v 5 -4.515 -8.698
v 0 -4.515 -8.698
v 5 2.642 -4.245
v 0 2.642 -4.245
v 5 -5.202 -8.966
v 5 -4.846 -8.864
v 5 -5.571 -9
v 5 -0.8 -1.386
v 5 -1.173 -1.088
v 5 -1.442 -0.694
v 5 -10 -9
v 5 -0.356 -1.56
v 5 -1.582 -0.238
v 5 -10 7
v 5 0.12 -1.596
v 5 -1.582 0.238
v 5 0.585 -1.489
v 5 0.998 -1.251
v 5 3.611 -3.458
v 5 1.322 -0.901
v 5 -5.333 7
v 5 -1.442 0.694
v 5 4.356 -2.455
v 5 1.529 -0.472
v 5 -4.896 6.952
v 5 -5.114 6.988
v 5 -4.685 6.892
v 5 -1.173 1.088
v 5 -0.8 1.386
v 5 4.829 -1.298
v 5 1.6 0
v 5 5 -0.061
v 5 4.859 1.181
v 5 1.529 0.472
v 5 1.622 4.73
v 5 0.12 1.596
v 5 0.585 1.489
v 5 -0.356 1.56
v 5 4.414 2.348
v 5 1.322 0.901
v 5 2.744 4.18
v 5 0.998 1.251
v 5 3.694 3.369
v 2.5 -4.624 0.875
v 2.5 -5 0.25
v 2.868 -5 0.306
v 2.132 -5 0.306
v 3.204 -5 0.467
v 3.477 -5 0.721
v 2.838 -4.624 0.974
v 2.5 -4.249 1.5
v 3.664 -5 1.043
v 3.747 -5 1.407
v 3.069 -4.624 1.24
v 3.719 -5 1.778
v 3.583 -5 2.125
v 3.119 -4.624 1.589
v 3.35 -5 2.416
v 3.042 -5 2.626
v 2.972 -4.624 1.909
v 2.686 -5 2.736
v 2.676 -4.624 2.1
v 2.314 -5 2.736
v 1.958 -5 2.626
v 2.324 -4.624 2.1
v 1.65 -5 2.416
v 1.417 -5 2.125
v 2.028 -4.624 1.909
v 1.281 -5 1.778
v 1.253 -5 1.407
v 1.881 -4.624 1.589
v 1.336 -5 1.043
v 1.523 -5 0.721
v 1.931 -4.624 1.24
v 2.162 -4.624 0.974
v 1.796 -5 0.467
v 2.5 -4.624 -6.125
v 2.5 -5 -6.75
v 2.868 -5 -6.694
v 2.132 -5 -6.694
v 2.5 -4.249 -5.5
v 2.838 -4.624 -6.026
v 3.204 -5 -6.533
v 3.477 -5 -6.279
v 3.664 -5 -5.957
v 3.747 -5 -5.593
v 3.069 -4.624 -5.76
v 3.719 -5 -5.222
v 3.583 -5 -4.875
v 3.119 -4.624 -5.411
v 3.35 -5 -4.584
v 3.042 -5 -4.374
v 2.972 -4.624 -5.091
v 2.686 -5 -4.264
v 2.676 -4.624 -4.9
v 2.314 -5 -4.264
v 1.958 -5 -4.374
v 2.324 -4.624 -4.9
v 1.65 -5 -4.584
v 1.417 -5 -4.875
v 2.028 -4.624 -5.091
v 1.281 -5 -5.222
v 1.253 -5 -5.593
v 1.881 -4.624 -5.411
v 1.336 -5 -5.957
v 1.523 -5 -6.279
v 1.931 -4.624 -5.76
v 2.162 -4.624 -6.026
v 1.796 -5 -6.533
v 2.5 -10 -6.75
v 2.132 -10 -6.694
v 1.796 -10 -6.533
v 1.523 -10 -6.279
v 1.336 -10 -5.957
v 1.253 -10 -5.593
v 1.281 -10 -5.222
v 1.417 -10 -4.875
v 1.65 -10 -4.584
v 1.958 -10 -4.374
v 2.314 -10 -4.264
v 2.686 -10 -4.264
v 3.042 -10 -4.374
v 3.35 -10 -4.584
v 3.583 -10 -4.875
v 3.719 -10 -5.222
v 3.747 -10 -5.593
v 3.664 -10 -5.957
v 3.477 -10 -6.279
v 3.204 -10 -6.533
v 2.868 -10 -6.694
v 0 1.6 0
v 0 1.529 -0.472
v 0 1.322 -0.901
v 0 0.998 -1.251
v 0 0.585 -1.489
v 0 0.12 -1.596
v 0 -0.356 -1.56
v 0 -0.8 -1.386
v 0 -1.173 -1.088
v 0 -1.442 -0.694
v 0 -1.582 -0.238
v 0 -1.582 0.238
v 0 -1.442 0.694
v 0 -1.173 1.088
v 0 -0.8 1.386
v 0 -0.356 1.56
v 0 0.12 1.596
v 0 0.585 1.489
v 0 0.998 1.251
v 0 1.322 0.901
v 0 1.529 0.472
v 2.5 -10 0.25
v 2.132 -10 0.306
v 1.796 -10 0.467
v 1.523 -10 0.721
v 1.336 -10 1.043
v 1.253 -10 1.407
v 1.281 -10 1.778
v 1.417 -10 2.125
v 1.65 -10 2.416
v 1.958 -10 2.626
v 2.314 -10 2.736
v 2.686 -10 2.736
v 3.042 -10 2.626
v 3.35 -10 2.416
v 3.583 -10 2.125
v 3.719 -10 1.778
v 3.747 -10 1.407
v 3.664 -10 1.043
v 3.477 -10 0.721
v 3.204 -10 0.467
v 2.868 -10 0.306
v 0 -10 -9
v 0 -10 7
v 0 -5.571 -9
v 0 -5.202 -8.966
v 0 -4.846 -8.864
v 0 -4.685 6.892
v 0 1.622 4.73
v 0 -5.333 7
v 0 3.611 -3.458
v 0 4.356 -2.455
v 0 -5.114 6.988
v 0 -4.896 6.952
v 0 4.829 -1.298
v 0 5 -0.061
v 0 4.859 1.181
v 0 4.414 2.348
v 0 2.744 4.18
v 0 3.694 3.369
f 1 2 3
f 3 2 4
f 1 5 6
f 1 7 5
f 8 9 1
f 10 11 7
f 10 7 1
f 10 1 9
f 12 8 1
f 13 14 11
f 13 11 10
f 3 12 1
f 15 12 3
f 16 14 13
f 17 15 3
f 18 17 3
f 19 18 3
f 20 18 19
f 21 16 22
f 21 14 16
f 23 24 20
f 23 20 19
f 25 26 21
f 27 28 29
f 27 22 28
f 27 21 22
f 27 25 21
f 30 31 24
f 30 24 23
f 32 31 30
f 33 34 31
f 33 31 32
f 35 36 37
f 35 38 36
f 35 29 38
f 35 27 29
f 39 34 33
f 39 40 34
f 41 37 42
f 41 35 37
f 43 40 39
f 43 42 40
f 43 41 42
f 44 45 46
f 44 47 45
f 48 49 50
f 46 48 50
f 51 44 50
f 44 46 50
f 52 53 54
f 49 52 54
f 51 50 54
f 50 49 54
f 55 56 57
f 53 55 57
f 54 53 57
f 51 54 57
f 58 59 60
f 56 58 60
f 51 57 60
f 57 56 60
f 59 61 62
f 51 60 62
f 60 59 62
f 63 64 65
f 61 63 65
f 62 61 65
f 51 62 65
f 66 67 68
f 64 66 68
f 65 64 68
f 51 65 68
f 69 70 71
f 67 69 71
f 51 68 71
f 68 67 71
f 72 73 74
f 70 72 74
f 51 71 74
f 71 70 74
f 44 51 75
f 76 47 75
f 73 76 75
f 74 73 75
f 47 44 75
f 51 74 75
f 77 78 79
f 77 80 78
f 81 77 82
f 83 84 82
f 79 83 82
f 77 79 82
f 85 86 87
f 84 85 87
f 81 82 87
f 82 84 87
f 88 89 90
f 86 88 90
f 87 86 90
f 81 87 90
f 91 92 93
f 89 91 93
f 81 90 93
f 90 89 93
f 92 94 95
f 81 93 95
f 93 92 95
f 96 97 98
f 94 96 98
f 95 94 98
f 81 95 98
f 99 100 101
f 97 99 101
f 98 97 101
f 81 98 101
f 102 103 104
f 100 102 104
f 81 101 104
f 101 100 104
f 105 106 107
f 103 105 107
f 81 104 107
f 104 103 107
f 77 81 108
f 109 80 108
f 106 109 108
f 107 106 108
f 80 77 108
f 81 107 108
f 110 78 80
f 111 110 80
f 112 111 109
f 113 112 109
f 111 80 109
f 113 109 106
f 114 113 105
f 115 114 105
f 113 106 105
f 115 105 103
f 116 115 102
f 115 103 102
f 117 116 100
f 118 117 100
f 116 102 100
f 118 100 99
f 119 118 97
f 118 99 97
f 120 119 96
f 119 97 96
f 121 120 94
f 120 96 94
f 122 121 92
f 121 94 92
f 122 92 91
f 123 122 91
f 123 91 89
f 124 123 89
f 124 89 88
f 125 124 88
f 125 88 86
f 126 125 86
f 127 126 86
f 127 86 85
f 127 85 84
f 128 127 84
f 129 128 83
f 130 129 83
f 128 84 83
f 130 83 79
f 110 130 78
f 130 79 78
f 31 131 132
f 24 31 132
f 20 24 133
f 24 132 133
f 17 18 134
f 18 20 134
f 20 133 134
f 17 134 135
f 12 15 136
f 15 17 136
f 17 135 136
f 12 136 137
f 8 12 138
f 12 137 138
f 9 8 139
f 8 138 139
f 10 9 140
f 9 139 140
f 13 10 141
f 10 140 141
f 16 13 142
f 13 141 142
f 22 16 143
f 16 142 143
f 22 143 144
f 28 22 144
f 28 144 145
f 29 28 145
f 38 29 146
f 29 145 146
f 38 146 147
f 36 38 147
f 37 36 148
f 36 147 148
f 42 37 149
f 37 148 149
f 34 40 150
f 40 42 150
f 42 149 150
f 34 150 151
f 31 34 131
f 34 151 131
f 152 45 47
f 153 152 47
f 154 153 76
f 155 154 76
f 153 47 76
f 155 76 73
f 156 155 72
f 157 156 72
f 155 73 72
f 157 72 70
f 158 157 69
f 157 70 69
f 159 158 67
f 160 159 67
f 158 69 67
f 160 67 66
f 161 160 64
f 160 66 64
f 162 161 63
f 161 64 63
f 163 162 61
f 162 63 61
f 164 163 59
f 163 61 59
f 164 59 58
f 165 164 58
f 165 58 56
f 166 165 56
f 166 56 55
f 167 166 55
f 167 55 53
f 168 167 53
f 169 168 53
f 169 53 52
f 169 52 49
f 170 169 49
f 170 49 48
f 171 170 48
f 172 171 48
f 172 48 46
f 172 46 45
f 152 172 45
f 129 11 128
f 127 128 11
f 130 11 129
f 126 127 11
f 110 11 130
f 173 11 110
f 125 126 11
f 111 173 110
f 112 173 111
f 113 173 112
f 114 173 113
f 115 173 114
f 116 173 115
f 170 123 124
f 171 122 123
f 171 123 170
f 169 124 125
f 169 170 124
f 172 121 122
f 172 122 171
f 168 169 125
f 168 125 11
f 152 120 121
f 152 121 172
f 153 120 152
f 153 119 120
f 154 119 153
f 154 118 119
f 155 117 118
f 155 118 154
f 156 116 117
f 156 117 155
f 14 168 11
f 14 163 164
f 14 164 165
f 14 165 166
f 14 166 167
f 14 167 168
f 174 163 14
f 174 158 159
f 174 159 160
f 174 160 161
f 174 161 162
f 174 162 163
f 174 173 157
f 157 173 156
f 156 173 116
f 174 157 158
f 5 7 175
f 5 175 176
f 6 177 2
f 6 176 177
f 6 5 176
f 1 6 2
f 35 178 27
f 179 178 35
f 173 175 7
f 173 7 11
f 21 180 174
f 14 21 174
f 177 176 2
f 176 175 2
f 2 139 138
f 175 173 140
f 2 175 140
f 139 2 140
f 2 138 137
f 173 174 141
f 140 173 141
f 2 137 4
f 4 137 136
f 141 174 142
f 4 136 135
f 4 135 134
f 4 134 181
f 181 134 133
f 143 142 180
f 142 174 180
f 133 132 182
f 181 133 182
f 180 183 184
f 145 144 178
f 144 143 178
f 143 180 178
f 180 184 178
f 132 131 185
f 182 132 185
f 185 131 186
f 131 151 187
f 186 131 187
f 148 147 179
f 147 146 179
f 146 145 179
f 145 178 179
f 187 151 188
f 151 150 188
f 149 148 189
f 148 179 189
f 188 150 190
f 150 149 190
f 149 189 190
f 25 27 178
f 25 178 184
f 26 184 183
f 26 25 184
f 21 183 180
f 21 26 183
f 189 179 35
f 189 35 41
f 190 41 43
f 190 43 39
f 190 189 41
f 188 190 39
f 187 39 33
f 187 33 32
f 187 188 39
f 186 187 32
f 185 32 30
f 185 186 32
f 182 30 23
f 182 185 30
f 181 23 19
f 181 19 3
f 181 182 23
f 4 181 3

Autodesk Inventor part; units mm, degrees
ref_plane "YZ Plane" through (0, 0, 0) normal (1, 0, 0) x (0, 1, 0)
ref_plane "XZ Plane" through (0, 0, 0) normal (0, 1, 0) x (-1, 0, 0)
ref_plane "XY Plane" through (0, 0, 0) normal (0, 0, 1) x (1, 0, 0)
sketch "スケッチ1" plane through (0, 0, 0) normal (1, 0, 0) x (0, 1, 0)
  circle A0 centre (0, 0) radius 5
  line L0 (5, 24) -> (-10, 24)
  line L1 (-10, 24) -> (-10, 9)
  line L2 (-10, 9) -> (5, 9)
  line L3 (5, 9) -> (5, 24)
  line L4 (-10, 9) -> (-15, 9)
  line L5 (-15, 9) -> (-15, -9)
  line L6 (-15, -9) -> (-10, -9)
  line L7 (-10, -9) -> (-10, 9)
  line L8 (-10, 9) -> (1.724, 4.6934)
  line L9 (1.724, -4.6934) -> (-10, -9)
  circle A1 centre (0, 0) radius 1.6
  line L10 (-10, 9) -> (-5, 9)
  line L11 (-5, 9) -> (-5, -9)
  line L12 (-5, -9) -> (-10, -9)
  line L13 (-10, -9) -> (-10, 9)
  line L14 (-5, 9) -> (2.6415, 4.2453)
  line L15 (-5, -9) -> (2.6415, -4.2453)
  line L16 (-5, 7) -> (-10, 7)
  line L17 (-5, 7) -> (1.6216, 4.7297)
  dimension "d0" = 10
  dimension "d1" = 15
  dimension "d2" = 15
  dimension "d3" = 5
  dimension "d5" = 18
  dimension "d6" = 3.2
  dimension "d7" = 10
  dimension "d8" = 9
  dimension "d11" = 5
  dimension "d12" = 18
  dimension "d29" = 2
extrude "押し出し2" add sketch "スケッチ1" along normal blind 5 contours A0 | A0 L8 L11 L14 | L15 L11 L9 A0 | L11 L8 L2 | L9 L11 A0 | L12 L9 L11 | L17 L11 L8 | A0 L11 L17 | L8 L11 L16 L7 | L11 L9 L7 L16
fillet "フィレット1" radius 2 2 edges at (2.5, -5, -9) (2.5, -5, 9)
sketch "スケッチ2" plane through (0, -10, -9) normal (0, -1, 0) x (1, 0, 0)
  circle A0 centre (2.5, 3.5) radius 1.25
  line L0 (0, 0) -> (5, 0) projected
  line L1 (0, 18) -> (0, 0) projected
  circle A1 centre (2.5, 10.5) radius 1.25
  point P0 (0, 9)
  dimension "d16" = 2.5
  dimension "d17" = 3.5
  dimension "d18" = 2.5
  dimension "d19" = 2.5
  dimension "d20" = 2.5
  dimension "d21" = 7
hole "穴1" at (2.5, -10, 1.5) at (2.5, -10, -5.5) direction (0, 1, 0) diameter 2.5 depth 5 tip angle 118
extrude "押し出し3" cut sketch "スケッチ1" along normal blind 10 contours A0 L8 L11 L14 | L11 L8 L2 | L17 L11 L8 | L8 L11 L16 L7
fillet "フィレット2" radius 2 1 edges at (2.5, -5, 7)
equation "\"d12\" = d5"
equation "\"d18\" = d16"
equation "\"d20\" = d18"
properties part number "belt_liner_v5_Plate_10" material "アルミニウム 6061"
